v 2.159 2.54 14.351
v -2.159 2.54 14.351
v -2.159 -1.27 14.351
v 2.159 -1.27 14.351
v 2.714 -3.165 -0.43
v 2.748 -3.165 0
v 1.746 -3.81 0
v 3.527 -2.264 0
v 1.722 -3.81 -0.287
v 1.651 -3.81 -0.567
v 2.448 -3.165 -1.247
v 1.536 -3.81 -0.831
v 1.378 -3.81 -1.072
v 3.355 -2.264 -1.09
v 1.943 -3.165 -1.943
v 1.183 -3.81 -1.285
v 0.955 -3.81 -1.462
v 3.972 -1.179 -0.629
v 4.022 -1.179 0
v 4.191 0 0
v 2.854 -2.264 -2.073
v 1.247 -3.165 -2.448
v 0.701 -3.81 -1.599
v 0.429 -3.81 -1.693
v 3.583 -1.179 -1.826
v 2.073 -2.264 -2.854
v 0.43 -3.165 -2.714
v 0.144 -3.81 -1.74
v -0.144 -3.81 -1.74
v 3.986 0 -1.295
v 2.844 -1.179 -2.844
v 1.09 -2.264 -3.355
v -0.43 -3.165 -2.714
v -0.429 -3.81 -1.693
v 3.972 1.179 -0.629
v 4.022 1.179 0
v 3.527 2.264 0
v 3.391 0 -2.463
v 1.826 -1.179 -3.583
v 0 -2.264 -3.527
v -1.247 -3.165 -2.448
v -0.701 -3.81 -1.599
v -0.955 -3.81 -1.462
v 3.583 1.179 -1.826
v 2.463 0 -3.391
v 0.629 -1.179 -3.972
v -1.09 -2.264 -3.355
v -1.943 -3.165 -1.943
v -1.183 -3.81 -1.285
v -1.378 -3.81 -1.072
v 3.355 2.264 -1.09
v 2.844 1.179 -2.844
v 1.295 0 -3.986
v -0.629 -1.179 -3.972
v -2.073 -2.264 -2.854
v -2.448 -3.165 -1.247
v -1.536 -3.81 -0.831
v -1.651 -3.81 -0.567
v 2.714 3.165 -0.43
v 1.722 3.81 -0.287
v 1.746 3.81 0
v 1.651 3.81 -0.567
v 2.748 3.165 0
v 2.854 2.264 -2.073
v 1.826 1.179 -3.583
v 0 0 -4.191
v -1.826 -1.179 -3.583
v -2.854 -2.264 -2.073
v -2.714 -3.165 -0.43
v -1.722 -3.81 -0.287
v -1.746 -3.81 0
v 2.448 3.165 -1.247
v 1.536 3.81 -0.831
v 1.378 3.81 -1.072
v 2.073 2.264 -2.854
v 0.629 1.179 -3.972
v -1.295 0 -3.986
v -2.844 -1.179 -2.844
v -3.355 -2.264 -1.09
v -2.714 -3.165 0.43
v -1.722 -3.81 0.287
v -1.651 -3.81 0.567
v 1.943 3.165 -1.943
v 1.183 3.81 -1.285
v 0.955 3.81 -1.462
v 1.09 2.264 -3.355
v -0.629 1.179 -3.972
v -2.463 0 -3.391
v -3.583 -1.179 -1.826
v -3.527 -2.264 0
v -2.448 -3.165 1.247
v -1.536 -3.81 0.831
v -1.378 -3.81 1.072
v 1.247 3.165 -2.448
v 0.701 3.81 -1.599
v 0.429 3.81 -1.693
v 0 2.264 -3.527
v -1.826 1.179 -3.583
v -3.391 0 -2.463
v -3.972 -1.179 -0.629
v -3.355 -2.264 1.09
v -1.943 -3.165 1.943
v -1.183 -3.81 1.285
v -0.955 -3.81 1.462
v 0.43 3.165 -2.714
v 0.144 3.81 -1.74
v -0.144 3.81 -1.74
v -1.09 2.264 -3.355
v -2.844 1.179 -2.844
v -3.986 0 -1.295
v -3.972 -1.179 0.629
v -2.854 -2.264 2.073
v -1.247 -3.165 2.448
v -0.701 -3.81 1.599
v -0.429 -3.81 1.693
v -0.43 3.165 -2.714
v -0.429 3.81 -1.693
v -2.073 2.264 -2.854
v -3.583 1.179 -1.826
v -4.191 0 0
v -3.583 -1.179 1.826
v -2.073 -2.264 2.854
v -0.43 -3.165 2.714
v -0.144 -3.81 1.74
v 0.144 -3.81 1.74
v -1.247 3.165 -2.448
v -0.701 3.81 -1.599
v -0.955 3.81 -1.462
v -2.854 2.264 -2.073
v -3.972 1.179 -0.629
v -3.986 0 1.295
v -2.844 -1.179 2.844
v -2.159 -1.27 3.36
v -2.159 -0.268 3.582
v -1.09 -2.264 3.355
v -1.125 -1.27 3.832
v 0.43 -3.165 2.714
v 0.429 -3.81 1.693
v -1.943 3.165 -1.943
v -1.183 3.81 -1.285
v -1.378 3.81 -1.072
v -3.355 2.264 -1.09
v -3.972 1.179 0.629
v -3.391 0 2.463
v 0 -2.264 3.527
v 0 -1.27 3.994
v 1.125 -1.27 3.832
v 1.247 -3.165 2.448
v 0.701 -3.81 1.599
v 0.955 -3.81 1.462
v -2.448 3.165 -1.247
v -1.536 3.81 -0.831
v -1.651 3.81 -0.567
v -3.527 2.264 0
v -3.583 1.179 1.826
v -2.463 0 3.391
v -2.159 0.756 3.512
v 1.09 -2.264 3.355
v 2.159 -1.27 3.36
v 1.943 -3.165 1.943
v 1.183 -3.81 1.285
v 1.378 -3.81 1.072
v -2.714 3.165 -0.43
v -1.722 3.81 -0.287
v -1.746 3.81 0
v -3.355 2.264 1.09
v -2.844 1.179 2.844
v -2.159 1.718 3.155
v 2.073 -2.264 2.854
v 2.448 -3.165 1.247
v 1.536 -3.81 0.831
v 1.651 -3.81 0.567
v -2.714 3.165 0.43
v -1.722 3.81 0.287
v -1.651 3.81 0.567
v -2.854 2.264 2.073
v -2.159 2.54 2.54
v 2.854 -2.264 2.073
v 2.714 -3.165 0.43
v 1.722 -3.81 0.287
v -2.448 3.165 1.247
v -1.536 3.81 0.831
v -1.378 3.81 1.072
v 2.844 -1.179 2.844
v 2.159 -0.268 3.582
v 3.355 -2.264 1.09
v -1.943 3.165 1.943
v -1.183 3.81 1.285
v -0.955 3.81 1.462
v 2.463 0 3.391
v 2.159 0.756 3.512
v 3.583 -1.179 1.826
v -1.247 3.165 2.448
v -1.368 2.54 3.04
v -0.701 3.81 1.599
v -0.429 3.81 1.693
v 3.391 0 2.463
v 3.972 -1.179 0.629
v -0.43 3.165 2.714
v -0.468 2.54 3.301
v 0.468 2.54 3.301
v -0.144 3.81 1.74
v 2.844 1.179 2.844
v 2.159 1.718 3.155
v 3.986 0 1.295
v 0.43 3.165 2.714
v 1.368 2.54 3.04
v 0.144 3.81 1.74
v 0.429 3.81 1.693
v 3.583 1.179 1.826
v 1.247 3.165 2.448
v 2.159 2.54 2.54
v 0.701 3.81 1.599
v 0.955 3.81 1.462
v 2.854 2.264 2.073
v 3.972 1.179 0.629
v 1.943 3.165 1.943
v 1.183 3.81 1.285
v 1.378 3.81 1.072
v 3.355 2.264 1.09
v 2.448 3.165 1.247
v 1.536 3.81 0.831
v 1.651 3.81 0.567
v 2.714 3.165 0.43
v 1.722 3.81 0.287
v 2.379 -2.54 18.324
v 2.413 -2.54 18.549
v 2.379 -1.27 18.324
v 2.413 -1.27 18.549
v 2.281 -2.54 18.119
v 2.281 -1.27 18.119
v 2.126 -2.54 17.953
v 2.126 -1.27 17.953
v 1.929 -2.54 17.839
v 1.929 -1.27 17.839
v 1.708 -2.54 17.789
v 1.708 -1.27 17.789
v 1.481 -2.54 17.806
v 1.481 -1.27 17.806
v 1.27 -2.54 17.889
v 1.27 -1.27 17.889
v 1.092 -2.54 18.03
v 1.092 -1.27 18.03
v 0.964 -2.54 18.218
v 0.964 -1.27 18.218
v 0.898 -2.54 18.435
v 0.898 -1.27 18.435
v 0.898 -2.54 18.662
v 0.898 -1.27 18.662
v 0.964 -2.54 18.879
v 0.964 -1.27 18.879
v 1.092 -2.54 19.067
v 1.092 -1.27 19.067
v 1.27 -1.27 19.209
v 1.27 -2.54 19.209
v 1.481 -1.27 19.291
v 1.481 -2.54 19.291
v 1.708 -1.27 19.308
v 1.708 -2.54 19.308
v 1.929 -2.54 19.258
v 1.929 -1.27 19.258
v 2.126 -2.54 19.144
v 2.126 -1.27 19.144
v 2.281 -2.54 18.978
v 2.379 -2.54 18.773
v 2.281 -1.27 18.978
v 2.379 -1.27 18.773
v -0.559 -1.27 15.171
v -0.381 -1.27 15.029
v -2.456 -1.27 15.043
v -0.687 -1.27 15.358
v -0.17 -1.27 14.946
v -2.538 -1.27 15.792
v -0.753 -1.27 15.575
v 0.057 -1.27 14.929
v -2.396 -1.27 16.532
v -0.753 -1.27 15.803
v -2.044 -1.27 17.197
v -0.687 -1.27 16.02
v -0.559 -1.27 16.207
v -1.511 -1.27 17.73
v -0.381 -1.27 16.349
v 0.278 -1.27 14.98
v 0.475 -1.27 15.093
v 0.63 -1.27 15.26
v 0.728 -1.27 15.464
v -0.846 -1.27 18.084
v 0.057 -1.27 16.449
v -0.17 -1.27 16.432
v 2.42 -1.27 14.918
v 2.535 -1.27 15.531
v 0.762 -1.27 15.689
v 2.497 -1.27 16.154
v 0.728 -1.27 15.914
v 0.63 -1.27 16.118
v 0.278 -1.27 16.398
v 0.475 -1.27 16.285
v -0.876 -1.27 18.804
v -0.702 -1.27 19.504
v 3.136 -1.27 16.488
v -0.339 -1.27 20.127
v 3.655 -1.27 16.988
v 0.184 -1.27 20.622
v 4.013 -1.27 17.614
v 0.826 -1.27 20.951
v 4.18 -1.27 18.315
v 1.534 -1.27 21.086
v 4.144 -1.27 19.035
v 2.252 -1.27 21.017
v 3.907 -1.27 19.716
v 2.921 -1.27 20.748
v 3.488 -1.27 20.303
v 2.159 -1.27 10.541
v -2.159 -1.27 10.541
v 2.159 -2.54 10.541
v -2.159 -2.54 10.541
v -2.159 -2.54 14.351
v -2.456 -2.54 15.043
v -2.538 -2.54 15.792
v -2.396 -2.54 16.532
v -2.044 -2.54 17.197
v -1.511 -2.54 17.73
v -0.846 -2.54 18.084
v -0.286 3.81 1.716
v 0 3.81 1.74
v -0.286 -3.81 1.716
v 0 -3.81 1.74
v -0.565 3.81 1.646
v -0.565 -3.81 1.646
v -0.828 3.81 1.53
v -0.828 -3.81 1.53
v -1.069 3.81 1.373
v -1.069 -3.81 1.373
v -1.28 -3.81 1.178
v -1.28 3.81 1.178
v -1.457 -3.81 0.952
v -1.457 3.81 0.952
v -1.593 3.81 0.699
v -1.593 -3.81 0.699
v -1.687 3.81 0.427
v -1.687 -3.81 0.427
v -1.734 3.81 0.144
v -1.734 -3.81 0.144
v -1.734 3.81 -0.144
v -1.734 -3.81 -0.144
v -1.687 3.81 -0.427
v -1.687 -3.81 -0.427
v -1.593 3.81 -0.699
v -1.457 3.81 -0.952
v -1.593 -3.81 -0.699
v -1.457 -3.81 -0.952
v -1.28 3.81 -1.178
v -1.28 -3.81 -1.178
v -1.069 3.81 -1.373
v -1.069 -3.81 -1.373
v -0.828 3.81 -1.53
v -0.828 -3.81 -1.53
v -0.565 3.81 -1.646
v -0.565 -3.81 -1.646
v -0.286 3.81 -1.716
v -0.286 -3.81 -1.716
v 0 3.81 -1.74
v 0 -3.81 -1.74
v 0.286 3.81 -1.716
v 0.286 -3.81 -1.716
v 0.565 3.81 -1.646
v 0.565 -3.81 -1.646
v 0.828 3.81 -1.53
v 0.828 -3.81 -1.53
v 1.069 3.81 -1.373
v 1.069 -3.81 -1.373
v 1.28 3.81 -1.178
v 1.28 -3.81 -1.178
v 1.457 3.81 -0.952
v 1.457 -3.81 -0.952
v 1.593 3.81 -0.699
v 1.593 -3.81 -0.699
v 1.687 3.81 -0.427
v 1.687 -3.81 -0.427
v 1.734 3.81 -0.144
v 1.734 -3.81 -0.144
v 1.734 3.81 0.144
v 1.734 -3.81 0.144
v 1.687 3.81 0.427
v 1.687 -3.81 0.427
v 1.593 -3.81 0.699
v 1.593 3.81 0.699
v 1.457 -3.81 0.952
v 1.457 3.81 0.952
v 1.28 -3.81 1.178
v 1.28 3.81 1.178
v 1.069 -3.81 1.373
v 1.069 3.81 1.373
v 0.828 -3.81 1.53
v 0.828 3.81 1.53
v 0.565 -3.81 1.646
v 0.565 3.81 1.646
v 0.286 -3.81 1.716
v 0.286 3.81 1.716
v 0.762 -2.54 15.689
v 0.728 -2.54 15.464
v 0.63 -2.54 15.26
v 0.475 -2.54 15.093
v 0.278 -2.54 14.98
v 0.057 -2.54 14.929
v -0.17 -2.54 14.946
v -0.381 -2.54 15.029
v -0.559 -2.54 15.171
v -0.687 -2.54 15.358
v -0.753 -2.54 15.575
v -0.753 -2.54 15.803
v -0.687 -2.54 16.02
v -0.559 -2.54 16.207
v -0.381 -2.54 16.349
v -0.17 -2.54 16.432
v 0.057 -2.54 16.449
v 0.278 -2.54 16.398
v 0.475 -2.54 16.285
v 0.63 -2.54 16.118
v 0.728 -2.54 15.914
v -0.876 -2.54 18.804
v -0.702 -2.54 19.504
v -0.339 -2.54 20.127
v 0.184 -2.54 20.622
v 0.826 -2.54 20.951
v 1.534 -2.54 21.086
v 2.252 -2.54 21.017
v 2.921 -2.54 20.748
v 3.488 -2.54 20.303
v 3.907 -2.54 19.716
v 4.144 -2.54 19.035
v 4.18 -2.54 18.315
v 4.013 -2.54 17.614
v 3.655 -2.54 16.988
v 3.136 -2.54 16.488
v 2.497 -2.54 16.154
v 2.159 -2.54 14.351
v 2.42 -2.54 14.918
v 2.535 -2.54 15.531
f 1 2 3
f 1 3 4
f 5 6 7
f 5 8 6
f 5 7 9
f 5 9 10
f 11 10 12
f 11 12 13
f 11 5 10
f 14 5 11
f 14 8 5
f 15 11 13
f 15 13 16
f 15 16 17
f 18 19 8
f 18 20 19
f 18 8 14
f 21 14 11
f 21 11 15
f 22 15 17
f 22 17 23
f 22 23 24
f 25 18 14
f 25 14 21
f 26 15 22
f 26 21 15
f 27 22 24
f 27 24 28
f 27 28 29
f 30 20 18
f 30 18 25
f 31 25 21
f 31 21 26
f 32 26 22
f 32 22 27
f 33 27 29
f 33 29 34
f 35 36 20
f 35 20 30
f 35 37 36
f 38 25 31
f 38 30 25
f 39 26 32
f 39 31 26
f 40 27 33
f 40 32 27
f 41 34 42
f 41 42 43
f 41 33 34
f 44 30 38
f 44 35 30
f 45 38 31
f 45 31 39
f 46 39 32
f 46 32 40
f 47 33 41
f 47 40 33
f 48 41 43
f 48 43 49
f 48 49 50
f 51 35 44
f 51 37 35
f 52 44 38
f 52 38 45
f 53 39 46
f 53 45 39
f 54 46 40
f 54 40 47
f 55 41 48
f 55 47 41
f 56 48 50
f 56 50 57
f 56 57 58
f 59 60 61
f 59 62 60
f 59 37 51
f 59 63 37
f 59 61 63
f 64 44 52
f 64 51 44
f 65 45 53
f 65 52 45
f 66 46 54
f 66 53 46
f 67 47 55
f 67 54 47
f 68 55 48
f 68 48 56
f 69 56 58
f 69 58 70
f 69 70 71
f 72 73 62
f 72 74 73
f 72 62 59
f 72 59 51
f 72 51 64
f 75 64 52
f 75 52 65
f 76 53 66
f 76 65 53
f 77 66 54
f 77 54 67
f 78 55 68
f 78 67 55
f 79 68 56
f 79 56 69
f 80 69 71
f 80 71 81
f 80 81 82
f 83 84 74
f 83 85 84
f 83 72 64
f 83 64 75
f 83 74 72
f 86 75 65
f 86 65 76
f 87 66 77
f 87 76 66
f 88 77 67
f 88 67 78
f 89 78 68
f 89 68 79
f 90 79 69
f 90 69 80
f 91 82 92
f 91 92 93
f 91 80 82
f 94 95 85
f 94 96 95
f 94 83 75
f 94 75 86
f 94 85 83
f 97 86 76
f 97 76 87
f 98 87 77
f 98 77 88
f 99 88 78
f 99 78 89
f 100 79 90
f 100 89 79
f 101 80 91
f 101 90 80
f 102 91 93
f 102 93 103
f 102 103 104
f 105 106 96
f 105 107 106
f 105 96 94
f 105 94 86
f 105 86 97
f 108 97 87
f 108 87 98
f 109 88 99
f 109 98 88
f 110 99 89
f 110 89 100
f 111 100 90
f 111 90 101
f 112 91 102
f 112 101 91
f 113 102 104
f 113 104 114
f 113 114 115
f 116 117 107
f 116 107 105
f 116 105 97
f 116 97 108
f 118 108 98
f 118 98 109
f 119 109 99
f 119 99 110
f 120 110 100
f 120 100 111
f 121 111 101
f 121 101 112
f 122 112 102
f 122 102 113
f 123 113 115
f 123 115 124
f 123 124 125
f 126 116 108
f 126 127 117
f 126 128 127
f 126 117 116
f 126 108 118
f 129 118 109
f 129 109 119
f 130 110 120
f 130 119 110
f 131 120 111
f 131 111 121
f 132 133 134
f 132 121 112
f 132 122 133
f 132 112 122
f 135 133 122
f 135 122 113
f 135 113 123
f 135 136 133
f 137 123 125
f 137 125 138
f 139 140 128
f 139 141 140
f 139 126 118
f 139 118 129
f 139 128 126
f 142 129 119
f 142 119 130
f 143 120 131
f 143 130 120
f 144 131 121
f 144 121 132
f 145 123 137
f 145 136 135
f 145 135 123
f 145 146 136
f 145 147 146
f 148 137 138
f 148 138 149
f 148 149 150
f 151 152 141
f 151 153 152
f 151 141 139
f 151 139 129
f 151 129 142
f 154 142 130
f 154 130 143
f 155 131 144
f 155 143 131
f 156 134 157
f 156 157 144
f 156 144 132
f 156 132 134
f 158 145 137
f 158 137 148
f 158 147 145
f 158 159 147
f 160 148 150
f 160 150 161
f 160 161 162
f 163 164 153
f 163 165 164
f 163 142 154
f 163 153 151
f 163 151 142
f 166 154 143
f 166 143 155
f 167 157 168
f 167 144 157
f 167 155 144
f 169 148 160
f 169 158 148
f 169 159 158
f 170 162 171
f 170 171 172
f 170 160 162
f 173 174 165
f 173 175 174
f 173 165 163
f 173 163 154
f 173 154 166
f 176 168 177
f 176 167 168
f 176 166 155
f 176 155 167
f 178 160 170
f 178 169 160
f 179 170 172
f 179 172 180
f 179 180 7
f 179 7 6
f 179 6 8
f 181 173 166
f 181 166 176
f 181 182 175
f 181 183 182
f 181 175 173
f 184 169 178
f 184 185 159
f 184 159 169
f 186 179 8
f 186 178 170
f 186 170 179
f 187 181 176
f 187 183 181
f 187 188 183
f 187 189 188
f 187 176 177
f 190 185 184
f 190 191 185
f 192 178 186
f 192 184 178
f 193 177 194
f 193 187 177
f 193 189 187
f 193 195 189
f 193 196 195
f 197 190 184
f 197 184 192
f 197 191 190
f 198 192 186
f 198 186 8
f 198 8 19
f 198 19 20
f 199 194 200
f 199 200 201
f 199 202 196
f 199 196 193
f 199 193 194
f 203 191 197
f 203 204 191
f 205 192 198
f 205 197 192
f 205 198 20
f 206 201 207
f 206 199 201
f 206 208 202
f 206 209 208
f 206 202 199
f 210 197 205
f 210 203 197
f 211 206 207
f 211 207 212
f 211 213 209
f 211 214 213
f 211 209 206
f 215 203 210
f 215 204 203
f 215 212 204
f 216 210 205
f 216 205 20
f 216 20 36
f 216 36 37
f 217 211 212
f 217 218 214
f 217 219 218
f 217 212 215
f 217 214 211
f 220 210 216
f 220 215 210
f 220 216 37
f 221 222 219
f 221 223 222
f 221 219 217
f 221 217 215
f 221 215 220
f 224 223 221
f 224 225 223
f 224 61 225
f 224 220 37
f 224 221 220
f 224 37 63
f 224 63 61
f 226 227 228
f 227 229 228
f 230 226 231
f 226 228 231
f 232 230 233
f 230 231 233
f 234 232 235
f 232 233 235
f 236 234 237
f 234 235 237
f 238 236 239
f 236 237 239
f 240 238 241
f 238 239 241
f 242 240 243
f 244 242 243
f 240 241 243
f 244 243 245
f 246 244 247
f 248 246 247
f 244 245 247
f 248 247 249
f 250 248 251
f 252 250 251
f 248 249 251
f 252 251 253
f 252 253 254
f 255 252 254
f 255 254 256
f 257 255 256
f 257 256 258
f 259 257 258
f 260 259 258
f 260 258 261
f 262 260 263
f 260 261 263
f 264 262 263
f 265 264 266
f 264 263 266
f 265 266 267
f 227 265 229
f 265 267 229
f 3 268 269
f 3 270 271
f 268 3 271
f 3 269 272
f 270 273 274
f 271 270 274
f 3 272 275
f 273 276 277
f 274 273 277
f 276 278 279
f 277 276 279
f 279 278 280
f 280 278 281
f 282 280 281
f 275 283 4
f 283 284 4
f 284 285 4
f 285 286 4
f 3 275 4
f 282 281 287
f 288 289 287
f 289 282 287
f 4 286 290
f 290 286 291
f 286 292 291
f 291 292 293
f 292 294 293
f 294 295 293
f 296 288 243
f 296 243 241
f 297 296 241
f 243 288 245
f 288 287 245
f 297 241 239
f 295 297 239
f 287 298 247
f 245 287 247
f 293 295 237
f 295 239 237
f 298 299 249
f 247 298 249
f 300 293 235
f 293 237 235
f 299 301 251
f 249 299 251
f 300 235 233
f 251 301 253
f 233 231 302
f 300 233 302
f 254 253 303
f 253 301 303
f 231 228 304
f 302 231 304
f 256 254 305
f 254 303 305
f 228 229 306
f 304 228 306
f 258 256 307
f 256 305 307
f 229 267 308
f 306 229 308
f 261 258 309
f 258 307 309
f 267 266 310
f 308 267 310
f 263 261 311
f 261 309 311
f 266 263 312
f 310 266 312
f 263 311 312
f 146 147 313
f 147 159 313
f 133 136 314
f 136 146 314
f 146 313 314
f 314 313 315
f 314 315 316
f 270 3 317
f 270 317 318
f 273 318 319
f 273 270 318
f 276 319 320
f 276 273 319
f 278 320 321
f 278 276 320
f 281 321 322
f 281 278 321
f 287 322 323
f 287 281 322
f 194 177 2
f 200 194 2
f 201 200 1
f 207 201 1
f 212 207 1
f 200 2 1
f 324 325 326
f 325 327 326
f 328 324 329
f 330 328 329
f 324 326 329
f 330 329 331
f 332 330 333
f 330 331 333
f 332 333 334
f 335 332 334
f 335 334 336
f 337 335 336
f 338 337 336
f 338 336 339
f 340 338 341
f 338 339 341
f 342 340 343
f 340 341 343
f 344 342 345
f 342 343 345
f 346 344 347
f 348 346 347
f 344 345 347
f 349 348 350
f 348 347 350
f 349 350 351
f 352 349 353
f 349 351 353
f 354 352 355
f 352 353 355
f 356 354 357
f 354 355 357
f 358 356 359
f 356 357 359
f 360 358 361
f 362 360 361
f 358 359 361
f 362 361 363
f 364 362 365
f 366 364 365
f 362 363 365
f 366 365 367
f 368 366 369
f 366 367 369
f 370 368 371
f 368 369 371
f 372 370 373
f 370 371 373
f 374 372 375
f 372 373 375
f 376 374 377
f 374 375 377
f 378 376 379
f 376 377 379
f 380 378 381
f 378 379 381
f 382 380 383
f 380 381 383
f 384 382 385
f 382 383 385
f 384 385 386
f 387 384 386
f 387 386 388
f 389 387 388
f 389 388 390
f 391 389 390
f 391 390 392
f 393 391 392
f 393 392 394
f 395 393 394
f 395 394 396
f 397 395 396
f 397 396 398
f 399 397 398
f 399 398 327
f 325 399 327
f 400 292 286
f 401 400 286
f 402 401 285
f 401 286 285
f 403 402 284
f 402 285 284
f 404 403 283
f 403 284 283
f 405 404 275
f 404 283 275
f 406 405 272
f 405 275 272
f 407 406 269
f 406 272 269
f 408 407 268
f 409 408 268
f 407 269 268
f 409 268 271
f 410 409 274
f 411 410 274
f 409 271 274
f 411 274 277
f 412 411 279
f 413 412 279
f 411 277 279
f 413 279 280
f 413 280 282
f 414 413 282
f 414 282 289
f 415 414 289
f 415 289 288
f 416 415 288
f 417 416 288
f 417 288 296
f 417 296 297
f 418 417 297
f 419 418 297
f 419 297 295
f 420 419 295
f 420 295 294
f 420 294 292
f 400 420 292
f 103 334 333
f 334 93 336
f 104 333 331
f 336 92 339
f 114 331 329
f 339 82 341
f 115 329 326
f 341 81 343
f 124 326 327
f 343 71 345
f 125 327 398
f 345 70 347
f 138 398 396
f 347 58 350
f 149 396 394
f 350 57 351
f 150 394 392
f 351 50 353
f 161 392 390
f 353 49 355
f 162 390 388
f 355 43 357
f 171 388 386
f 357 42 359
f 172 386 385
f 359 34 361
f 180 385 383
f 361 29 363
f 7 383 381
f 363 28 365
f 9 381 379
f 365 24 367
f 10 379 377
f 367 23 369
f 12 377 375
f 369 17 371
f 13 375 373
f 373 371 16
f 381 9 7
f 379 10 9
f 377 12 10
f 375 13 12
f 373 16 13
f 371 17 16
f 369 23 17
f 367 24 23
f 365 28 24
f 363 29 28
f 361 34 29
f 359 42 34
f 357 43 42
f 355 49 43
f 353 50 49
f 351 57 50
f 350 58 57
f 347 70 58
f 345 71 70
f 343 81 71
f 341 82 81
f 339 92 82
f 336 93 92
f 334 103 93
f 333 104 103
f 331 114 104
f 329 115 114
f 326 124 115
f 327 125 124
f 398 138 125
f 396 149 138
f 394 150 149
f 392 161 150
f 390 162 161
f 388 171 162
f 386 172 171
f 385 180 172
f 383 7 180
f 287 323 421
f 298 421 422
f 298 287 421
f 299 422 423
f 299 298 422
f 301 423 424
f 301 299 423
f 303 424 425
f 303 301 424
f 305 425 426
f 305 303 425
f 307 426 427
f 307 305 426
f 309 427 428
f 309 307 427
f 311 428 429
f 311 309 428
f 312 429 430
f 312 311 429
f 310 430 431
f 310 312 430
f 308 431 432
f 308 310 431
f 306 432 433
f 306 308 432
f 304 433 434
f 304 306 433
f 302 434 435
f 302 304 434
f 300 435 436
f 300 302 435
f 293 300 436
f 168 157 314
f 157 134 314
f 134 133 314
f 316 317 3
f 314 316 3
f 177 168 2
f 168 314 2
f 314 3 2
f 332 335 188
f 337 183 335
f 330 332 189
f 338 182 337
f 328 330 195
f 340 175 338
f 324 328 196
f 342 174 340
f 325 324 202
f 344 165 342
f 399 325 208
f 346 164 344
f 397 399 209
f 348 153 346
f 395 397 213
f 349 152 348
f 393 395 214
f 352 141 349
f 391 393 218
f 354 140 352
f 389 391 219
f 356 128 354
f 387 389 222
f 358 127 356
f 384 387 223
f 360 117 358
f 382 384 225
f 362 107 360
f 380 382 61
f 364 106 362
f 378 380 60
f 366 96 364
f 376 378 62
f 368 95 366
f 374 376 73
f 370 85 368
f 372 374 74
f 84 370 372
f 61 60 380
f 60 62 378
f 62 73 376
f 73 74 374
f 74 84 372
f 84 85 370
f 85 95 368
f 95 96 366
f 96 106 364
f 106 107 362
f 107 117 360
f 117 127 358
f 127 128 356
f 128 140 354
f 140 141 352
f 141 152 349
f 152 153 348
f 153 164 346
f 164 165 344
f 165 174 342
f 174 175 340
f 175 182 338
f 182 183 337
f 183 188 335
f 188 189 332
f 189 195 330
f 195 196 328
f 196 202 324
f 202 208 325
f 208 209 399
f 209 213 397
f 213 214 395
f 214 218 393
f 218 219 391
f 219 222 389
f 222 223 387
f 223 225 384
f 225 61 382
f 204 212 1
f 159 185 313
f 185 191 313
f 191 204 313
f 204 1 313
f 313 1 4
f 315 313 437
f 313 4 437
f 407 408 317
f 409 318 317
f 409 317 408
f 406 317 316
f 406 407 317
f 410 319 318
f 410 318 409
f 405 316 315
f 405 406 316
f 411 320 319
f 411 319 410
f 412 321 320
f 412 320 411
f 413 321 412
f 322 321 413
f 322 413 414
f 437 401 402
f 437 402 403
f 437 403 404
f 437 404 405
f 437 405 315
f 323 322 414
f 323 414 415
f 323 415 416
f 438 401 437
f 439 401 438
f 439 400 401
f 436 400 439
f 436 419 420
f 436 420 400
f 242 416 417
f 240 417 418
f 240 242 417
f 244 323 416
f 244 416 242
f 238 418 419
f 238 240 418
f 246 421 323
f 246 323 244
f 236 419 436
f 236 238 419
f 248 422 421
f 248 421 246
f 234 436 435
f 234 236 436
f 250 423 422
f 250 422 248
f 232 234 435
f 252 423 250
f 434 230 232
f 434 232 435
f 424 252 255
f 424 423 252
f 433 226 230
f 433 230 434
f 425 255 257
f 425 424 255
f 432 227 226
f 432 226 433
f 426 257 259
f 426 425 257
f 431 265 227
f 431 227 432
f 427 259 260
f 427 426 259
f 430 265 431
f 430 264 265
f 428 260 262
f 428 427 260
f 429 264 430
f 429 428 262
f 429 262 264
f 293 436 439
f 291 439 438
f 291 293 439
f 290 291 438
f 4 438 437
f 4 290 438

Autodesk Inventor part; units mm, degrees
ref_plane "YZ Plane" through (0, 0, 0) normal (1, 0, 0) x (0, 1, 0)
ref_plane "XZ Plane" through (0, 0, 0) normal (0, 1, 0) x (-1, 0, 0)
sketch "Sketch1" plane through (0, 0, 0) normal (0, 0, 1) x (1, 0, 0)
  line L0 (0, 3.81) -> (1.746, 3.81)
  line L1 (0, 0) -> (0, 7.4896) construction
  line L2 (0, 0) -> (13.1944, 0) construction
  line L3 (0, -3.81) -> (1.746, -3.81)
  arc A0 (1.746, -3.81) -> (1.746, 3.81) centre (0, 0) ccw
  line L4 (0, 3.81) -> (0, -3.81)
  point P0 (-6.8886, 3.81)
  point P1 (6.6767, 3.81)
  point P2 (0, 4.191)
  point P3 (0, 4.191)
  point P4 (-6.8886, -3.81)
  point P5 (6.6767, -3.81)
  point P6 (0, 4.191)
  point P7 (4.191, 0)
  dimension "d1" = 0.381
  dimension "d11" = 4.191
revolve "Revolution1" add sketch "Sketch1" angle 360 about axis through (0, 0, 0) along (0, 1, 0)
sketch "Sketch2" plane through (0, 3.81, 0) normal (0, 1, 0) x (1, 0, 0)
  circle A0 centre (0, 0) radius 1.746 projected
  dimension "d3" = 3.4919
hole "Hole1" at (0, 3.81, 0) direction (0, -1, 0) diameter 3.4798 end through all
ref_plane "Work Plane1" through (0, 0, 4.191) normal (0, 0, 1) x (1, 0, 0)
sketch "Sketch3" plane through (0, 0, 4.191) normal (0, 0, 1) x (1, 0, 0)
  line L0 (-2.159, 2.54) -> (2.159, 2.54)
  line L1 (2.159, 2.54) -> (2.159, -1.27)
  line L2 (2.159, -1.27) -> (-2.159, -1.27)
  line L3 (-2.159, -1.27) -> (-2.159, 2.54)
  line L4 (1.746, 3.81) -> (-1.746, 3.81) projected
  point P0 (0, 0)
  point P1 (0, 2.54)
  dimension "d13" = 4.318
  dimension "d14" = 3.81
  dimension "d15" = 1.27
extrude "Extrusion1" add sketch "Sketch3" along normal blind 10.16
ref_plane "Work Plane2" through (0, 0, 1.7399) normal (0, 0, 1) x (1, 0, 0)
extrude "Extrusion2" add sketch "Sketch3" against normal up to surface (2.4511 mm away)
sketch "Sketch4" plane through (0, -1.27, 0) normal (0, -1, 0) x (1, 0, 0)
  line L0 (2.159, 2.54) -> (2.159, 14.351) projected
  line L1 (2.159, 10.541) -> (-2.159, 10.541)
  line L2 (-2.159, 10.541) -> (-2.159, 14.351)
  line L3 (-2.159, 14.351) -> (2.159, 14.351)
  line L4 (2.159, 14.351) -> (2.159, 10.541) construction
  line L5 (-2.159, 14.351) -> (2.159, 14.351) projected
  circle A0 centre (0, 15.689) radius 0.762
  circle A1 centre (0, 15.689) radius 2.54
  circle A2 centre (1.651, 18.5486) radius 0.762
  circle A3 centre (1.651, 18.5486) radius 2.54
  point P0 (0, 0)
  point P1 (2.159, 14.351)
  point P2 (0, 14.351)
  point P3 (2.159, 14.351)
  point P4 (4.191, 18.5486)
  point P5 (-0.8461, 18.084)
  point P6 (1.27, 17.8887)
  point P7 (2.4971, 16.1537)
  point P8 (-0.889, 18.5486)
  dimension "d22" = 3.81
  dimension "d25" = 1.524
  dimension "d27" = 5.08
  dimension "d30" = 1.524
  dimension "d31" = 5.08
  dimension "d33" = 4.318
  dimension "d34" = 1.27
extrude "Extrusion4" add sketch "Sketch4" along normal blind 1.27
properties part number "Left Arm" material "Phenolic Resin"
